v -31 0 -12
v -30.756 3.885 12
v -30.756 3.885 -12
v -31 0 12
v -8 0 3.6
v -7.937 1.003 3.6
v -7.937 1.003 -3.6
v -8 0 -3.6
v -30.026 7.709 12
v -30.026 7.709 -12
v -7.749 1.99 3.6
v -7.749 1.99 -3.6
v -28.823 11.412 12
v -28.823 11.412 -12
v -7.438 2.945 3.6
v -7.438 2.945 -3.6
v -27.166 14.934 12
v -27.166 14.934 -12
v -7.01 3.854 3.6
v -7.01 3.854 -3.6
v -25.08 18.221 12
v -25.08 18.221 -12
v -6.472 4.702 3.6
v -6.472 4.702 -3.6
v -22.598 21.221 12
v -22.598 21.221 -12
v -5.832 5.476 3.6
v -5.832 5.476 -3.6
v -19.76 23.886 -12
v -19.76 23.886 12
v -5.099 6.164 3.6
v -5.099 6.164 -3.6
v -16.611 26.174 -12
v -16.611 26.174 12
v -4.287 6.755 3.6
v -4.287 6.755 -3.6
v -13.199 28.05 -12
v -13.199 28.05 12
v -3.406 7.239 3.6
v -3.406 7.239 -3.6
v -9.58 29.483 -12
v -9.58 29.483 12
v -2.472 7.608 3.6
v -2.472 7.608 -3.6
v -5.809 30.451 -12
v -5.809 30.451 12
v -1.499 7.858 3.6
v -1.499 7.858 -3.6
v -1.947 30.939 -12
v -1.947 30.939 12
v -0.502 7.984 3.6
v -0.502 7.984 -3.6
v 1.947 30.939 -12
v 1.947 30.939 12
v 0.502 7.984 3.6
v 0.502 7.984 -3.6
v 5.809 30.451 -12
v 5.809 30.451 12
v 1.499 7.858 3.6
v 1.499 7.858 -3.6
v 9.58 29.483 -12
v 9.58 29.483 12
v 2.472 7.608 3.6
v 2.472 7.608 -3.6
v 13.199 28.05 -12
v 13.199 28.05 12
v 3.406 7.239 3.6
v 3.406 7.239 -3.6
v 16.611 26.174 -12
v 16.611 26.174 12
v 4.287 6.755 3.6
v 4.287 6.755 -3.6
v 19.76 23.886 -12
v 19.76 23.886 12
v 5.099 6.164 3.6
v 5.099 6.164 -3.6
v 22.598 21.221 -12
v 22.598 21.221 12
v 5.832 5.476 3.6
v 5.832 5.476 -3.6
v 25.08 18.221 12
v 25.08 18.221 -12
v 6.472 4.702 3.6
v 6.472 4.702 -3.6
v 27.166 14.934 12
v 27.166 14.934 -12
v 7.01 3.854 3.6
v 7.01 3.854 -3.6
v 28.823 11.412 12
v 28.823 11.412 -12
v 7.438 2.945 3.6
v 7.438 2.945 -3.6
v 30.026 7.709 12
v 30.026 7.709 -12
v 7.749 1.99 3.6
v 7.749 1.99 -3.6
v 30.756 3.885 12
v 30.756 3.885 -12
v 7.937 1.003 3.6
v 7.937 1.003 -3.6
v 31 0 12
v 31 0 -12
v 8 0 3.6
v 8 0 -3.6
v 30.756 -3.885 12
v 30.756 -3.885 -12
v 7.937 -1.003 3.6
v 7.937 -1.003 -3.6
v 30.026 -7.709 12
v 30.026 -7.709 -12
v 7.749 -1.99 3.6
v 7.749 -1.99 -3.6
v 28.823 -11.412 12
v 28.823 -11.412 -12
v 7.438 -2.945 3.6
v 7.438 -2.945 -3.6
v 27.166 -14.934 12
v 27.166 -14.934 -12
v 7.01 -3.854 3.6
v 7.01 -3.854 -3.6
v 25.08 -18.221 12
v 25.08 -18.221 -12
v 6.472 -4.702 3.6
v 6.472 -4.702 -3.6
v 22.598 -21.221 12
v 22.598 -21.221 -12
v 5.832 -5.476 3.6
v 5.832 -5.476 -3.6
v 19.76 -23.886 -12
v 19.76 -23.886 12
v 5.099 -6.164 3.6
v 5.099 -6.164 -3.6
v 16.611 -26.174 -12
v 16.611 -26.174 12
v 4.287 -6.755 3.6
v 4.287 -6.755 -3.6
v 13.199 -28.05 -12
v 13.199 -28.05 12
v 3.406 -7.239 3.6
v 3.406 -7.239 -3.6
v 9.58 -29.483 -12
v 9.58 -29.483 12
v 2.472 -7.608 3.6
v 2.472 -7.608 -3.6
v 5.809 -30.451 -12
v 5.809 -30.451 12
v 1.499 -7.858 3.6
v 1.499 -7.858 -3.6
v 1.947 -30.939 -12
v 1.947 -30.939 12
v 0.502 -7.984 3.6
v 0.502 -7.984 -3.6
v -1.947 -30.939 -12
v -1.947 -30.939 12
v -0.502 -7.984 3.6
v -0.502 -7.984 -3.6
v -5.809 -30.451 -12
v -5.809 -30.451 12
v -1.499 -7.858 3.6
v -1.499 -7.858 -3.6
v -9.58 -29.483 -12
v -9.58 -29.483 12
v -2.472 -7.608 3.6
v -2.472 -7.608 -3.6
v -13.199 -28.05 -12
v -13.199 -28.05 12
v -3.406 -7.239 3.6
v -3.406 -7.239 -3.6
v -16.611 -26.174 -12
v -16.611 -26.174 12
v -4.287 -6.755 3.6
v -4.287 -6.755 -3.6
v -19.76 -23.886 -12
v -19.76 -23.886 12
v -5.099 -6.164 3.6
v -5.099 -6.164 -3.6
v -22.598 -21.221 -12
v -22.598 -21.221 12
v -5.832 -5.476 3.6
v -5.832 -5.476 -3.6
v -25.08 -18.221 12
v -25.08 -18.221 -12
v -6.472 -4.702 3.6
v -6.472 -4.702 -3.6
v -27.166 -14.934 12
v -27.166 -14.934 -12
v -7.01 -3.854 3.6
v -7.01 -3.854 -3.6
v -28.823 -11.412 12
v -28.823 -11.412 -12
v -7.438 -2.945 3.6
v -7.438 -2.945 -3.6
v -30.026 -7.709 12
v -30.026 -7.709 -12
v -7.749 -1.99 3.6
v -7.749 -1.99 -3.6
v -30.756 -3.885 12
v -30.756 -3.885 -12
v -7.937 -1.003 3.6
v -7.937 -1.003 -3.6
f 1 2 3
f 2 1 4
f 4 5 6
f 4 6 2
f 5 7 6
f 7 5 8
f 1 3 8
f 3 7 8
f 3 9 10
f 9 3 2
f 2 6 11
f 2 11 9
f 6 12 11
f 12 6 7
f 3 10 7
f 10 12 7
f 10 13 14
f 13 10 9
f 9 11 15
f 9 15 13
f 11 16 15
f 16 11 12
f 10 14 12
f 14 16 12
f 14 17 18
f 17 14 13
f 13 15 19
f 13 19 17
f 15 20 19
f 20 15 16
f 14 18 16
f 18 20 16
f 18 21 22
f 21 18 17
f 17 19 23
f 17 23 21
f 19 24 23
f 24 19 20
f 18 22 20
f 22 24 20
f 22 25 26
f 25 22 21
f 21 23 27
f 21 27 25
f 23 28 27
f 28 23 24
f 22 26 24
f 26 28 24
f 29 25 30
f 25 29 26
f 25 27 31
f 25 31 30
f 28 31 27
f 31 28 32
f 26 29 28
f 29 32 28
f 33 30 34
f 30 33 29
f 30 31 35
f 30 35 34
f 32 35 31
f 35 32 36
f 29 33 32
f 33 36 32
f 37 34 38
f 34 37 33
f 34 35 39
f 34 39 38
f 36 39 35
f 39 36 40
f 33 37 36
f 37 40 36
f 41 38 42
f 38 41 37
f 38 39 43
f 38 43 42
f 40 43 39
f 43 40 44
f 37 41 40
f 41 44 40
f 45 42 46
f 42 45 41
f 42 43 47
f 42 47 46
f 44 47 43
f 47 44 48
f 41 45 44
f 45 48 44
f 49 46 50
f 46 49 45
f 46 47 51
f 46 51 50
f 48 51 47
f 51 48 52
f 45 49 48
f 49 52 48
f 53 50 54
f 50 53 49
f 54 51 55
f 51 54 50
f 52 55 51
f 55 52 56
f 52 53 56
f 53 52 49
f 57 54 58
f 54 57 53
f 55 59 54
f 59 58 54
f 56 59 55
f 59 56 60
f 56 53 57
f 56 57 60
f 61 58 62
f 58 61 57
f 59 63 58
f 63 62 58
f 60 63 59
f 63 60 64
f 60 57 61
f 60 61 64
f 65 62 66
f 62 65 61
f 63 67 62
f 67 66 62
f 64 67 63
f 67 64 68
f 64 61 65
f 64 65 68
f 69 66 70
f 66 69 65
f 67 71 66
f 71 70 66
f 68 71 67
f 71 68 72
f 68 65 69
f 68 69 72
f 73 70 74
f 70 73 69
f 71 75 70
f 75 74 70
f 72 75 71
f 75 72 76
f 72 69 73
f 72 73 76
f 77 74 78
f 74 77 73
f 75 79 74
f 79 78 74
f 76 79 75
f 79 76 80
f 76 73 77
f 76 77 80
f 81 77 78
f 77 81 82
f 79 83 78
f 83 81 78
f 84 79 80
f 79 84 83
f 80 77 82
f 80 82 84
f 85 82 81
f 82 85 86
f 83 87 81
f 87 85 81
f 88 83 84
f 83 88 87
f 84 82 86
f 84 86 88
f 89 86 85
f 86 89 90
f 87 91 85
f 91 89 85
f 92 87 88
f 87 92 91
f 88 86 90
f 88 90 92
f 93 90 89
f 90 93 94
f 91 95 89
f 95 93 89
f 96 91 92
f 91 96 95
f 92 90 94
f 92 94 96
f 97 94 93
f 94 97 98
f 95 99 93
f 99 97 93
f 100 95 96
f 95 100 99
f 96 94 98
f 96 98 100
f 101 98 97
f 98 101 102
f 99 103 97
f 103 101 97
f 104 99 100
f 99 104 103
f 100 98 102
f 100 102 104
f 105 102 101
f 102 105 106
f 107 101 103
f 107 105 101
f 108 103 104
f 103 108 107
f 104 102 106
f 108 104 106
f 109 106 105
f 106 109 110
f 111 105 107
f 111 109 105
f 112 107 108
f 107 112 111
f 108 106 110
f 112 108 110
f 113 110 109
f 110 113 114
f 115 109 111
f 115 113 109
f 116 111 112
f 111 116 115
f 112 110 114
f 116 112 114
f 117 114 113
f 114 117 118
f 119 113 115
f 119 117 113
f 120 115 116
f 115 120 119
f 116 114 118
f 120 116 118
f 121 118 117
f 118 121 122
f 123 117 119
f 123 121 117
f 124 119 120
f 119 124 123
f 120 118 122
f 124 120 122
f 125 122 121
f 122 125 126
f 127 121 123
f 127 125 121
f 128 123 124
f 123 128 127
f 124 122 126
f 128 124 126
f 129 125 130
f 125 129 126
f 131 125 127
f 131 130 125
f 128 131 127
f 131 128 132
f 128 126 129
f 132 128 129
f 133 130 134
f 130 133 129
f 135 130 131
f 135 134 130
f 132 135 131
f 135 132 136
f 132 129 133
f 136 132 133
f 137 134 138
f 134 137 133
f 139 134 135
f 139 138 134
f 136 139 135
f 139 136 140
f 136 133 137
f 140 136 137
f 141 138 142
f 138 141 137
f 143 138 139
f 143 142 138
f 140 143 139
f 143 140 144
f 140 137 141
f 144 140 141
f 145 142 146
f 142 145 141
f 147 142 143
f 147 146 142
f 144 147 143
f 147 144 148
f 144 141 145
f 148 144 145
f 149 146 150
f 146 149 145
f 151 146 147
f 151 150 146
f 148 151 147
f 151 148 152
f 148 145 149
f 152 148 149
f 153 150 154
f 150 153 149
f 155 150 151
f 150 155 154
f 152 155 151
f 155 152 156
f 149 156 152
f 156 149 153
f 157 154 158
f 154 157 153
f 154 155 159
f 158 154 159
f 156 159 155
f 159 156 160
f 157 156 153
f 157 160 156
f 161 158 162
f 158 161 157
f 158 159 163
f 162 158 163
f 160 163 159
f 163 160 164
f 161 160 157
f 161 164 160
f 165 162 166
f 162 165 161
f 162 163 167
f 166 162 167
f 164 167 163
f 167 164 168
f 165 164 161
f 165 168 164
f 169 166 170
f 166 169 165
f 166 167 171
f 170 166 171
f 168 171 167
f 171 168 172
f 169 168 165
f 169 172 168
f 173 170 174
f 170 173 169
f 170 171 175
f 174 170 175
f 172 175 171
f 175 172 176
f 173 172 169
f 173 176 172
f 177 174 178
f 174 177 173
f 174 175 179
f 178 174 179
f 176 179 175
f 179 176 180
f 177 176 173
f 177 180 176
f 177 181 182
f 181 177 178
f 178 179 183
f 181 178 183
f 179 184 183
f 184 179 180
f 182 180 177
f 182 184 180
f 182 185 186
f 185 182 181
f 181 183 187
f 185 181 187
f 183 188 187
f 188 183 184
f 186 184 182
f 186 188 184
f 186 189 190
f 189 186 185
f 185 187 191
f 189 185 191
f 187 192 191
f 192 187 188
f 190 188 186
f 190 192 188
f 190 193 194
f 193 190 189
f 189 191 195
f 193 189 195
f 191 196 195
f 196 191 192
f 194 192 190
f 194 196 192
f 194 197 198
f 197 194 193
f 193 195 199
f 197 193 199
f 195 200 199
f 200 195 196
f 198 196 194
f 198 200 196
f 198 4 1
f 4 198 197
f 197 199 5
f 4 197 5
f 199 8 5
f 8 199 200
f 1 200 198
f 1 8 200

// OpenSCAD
$fn = 50;difference() {
	union() {
		rotate_extrude(angle = 360) {
			translate(v = [8, 0, 0]) {
				rotate(a = [0, 0, -90]) {
					polygon(points = [[3.6, 0], [12, 23], [-12, 23], [-3.6, 0]]);
				}
			}
		}
	}
	union();
}
